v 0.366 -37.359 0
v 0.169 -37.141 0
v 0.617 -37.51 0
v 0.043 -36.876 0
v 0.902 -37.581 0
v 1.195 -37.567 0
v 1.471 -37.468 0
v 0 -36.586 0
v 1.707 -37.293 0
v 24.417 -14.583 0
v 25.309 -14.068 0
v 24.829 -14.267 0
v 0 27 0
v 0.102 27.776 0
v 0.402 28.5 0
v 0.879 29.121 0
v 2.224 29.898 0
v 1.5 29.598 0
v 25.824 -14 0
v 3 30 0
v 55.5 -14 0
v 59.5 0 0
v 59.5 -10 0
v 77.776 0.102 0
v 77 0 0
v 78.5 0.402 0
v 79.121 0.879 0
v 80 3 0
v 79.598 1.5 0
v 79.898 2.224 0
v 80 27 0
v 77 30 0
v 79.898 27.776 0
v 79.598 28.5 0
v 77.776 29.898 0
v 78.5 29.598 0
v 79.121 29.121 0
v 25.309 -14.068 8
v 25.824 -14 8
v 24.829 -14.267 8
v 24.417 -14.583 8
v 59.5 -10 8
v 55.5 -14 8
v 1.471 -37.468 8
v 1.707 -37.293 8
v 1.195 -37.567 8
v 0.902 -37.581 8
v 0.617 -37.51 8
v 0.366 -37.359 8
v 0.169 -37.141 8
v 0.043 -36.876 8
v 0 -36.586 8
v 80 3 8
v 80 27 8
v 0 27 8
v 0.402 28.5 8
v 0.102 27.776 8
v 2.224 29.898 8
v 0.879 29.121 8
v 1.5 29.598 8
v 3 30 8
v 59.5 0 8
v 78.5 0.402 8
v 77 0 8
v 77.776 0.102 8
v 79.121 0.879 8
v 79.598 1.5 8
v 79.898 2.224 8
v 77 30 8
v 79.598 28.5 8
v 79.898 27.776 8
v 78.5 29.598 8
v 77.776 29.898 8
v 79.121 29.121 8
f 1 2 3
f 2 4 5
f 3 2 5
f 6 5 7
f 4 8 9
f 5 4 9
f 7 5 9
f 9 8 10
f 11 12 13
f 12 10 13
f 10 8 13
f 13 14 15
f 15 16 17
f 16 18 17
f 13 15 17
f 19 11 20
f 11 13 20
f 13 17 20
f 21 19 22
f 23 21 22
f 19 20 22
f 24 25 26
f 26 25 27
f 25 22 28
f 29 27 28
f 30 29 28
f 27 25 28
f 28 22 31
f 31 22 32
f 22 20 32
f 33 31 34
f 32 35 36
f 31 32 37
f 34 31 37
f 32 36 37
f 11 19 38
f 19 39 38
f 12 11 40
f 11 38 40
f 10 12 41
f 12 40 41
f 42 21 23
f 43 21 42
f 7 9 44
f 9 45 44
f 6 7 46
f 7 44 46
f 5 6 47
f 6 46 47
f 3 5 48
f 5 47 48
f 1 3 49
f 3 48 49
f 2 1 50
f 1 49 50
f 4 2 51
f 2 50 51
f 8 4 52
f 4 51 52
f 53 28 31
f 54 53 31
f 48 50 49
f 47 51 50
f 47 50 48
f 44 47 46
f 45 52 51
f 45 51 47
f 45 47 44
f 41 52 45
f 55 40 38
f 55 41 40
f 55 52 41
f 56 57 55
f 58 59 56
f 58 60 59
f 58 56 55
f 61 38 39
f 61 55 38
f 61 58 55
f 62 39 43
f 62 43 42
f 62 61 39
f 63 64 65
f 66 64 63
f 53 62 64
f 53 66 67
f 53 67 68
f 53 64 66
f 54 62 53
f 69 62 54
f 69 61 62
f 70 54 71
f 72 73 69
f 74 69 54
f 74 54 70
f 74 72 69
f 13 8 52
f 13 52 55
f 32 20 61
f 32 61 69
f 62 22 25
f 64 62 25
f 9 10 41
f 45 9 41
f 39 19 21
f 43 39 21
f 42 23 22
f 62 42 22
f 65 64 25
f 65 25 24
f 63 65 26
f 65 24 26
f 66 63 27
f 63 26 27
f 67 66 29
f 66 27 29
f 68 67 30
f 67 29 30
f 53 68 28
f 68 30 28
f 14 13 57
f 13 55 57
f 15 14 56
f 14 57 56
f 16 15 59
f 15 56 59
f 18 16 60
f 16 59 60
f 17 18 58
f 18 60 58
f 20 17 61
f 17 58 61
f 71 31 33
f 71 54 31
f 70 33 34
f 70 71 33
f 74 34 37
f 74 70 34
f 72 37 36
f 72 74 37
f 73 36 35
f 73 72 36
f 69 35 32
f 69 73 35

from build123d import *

# Parameters (mm, degrees)
BOX028_W          = 27
BOX028_H          = 14
BOX028_DEPTH      = 22
BOX009_W          = 80
BOX009_H          = 44
BOX009_DEPTH      = 8
BOX021_W          = 26
BOX021_H          = 26
BOX021_DEPTH      = 8
BOX020_W          = 26
BOX020_H          = 26
BOX020_DEPTH      = 8
CHAMFER017_SIZE   = 25
FILLET004003004_R = 1
FILLET004003005_R = 1.99
FILLET004003006_R = 3
CHAMFER033_SIZE   = 4
FILLET004003008_R = 3


with BuildPart() as cube028:
    # Box028 → Box028 (new body)
    with BuildSketch(Plane(origin=(59.5, -14, -7.5), x_dir=(1, 0, 0), z_dir=(0, 0, 1))):
        with Locations((13.5, 7)):
            Rectangle(BOX028_W, BOX028_H)
    extrude(amount=BOX028_DEPTH)


with BuildPart() as cube009:
    # Box009 → Box009 (new body)
    with BuildSketch(Plane(origin=(0, -14, 0), x_dir=(1, 0, 0), z_dir=(0, 0, 1))):
        with Locations((40, 22)):
            Rectangle(BOX009_W, BOX009_H)
    extrude(amount=BOX009_DEPTH)


with BuildPart() as cube021:
    # Box021 → Box021 (new body)
    with BuildSketch(Plane(origin=(-26, -39, 0), x_dir=(1, 0, 0), z_dir=(0, 0, 1))):
        with Locations((13, 13)):
            Rectangle(BOX021_W, BOX021_H)
    extrude(amount=BOX021_DEPTH)


with BuildPart() as fillet004003008:
    # Box020 → Box020 (new body)
    with BuildSketch(Plane(origin=(-1, -39, 0), x_dir=(1, 0, 0), z_dir=(0, 0, 1))):
        with Locations((13, 13)):
            Rectangle(BOX020_W, BOX020_H)
    extrude(amount=BOX020_DEPTH)

    # Chamfer017
    chamfer017_edges = [fillet004003008.edges().sort_by_distance(p)[0] for p in [
        (25, -39, 4),
    ]]
    chamfer(chamfer017_edges, length=CHAMFER017_SIZE)

    # Cut002008010: cut Cube021
    add(cube021.part, mode=Mode.SUBTRACT)

    # Fillet004003004
    fillet004003004_edges = [fillet004003008.edges().sort_by_distance(p)[0] for p in [
        (0, -39, 4),
    ]]
    fillet(fillet004003004_edges, radius=FILLET004003004_R)

    # Fusion006002011004053036004001003009006004: union Cube009
    add(cube009.part)

    # Fillet004003005
    fillet004003005_edges = [fillet004003008.edges().sort_by_distance(p)[0] for p in [
        (25, -14, 4),
    ]]
    fillet(fillet004003005_edges, radius=FILLET004003005_R)

    # Fillet004003006
    fillet004003006_edges = [fillet004003008.edges().sort_by_distance(p)[0] for p in [
        (80, -14, 4),
        (80, 30, 4),
        (0, 30, 4),
    ]]
    fillet(fillet004003006_edges, radius=FILLET004003006_R)

    # Cut002008023012003: cut Cube028
    add(cube028.part, mode=Mode.SUBTRACT)

    # Chamfer033
    chamfer033_edges = [fillet004003008.edges().sort_by_distance(p)[0] for p in [
        (59.5, -14, 4),
    ]]
    chamfer(chamfer033_edges, length=CHAMFER033_SIZE)

    # Fillet004003008
    fillet004003008_edges = [fillet004003008.edges().sort_by_distance(p)[0] for p in [
        (80, 0, 4),
    ]]
    fillet(fillet004003008_edges, radius=FILLET004003008_R)


solid = fillet004003008.part
